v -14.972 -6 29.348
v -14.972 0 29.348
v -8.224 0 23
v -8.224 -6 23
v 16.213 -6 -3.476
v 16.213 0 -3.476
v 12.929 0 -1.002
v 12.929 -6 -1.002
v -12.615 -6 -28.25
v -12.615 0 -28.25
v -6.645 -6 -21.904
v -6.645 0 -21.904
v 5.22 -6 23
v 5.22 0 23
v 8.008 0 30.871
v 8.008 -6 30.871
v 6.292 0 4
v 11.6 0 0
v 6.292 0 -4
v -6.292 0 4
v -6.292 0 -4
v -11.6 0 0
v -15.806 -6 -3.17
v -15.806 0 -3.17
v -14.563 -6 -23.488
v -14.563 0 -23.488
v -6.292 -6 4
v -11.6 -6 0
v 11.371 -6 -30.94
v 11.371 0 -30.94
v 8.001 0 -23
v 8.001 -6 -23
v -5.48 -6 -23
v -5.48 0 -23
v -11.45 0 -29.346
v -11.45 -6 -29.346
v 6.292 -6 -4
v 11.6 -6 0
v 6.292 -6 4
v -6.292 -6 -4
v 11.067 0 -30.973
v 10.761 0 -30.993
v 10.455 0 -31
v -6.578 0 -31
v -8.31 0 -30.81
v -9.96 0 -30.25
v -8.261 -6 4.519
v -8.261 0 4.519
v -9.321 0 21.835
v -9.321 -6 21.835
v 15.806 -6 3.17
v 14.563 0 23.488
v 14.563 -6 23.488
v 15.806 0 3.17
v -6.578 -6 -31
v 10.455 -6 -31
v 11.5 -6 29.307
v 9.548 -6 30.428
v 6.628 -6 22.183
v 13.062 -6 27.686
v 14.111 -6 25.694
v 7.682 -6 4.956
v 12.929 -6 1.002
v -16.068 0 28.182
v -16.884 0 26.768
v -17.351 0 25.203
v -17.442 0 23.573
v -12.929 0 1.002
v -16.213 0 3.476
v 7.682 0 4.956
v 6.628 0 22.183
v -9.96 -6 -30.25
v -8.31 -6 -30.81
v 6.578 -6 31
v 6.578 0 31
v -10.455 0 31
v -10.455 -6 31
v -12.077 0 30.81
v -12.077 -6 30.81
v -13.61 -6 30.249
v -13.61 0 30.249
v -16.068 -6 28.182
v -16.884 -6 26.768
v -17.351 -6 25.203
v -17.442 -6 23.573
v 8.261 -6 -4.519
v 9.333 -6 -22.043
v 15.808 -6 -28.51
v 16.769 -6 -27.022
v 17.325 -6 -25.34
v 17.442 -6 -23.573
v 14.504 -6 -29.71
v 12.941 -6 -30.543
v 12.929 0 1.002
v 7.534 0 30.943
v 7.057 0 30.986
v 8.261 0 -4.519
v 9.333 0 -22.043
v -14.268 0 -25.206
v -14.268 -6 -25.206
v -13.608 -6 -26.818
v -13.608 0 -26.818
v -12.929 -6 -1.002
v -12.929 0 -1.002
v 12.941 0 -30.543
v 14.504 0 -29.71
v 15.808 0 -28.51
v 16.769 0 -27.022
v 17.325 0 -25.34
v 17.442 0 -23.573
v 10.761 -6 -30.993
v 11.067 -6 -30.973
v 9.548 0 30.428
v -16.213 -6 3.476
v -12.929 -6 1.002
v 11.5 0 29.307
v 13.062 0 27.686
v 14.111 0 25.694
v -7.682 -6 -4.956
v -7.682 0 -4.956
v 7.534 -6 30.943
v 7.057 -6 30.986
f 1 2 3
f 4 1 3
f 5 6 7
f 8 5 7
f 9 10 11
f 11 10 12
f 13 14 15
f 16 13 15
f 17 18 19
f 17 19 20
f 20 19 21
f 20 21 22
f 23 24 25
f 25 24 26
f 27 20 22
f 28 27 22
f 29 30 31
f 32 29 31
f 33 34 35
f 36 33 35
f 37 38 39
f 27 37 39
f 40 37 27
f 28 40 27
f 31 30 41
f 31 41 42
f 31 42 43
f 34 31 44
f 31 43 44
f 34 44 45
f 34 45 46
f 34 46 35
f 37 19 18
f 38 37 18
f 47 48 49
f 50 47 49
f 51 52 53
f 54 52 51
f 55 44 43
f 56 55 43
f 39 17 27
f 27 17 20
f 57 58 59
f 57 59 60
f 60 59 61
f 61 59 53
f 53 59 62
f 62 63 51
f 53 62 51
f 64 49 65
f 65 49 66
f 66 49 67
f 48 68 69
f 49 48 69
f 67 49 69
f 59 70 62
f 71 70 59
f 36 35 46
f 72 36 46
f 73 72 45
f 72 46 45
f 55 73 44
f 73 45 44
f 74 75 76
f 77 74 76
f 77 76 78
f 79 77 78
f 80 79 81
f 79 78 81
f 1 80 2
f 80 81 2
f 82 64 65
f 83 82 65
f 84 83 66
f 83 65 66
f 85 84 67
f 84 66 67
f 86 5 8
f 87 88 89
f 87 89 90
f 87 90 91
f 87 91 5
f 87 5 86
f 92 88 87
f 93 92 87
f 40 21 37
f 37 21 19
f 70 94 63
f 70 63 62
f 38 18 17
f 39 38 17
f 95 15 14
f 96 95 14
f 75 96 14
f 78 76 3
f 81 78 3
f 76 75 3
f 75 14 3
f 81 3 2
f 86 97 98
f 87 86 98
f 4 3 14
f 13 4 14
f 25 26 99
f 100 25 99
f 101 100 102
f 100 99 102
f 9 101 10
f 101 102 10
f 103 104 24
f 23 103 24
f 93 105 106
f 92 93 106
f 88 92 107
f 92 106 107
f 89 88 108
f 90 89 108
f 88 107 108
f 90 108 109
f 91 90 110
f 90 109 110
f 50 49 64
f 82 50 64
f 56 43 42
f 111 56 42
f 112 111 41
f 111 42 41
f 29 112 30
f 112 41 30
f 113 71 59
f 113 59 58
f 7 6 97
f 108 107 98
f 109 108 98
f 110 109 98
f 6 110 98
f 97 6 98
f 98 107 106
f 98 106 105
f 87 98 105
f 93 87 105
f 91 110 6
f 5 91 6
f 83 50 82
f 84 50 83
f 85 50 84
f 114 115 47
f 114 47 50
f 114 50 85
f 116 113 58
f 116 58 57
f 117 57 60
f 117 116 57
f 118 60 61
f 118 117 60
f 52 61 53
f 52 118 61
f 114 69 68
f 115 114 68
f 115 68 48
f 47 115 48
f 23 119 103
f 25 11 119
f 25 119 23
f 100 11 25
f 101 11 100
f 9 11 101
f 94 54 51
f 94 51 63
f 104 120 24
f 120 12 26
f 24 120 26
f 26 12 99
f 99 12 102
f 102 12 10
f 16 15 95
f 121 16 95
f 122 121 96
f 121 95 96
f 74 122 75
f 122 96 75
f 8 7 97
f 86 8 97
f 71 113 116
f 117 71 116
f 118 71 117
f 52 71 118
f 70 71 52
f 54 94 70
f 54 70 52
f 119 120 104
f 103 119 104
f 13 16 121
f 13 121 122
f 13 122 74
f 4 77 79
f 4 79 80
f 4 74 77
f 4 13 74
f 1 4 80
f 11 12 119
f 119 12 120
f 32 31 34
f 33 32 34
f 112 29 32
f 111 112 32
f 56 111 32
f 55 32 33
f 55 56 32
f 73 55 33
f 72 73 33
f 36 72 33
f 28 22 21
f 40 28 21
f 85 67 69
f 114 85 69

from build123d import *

# Parameters (mm, degrees)
BOSS_EXTRUDE1_DEPTH   = 6
BOSS_EXTRUDE1_2_DEPTH = 6
BOSS_EXTRUDE1_3_DEPTH = 6
BOSS_EXTRUDE1_4_DEPTH = 6
BOSS_EXTRUDE1_5_DEPTH = 6
BOSS_EXTRUDE1_6_DEPTH = 6
BOSS_EXTRUDE1_7_DEPTH = 6


with BuildPart() as part:
    # Sketch3 → Boss-Extrude1 (new body)
    with BuildSketch(Plane(origin=(0, 0, 0), x_dir=(1, 0, 0), z_dir=(0, 1, 0))):
        with BuildLine():
            ThreePointArc((-14.563388627, 23.488388316), (-13.982347964, 26.029888674), (-12.614994756, 28.249613324))
            Line((-12.614994756, 28.249613324), (-6.645362379, 21.903707215))
            Line((-6.645362379, 21.903707215), (-7.681935248, 4.955890615))
            Line((-7.681935248, 4.955890615), (-12.929312113, 1.001708527))
            Line((-12.929312113, 1.001708527), (-15.806141704, 3.169555117))
            Line((-15.806141704, 3.169555117), (-14.563388627, 23.488388316))
        make_face()
    extrude(amount=-BOSS_EXTRUDE1_DEPTH)


with BuildPart() as body_2:
    # Sketch3 → Boss-Extrude1 2 (new body)
    with BuildSketch(Plane(origin=(0, 0, 0), x_dir=(1, 0, 0), z_dir=(0, 1, 0))):
        with BuildLine():
            ThreePointArc((10.454822074, 31), (10.91413207, 30.984914769), (11.371462409, 30.939724094))
            Line((11.371462409, 30.939724094), (8.001249484, 23))
            Line((8.001249484, 23), (-5.479968827, 23))
            Line((-5.479968827, 23), (-11.449601204, 29.345906109))
            ThreePointArc((-11.449601204, 29.345906109), (-9.150541871, 30.57519798), (-6.57831024, 31))
            Line((-6.57831024, 31), (10.454822074, 31))
        make_face()
    extrude(amount=-BOSS_EXTRUDE1_2_DEPTH)


with BuildPart() as body_3:
    # Sketch3 → Boss-Extrude1 3 (new body)
    with BuildSketch(Plane(origin=(0, 0, 0), x_dir=(1, 0, 0), z_dir=(0, 1, 0))):
        with BuildLine():
            ThreePointArc((12.941431756, 30.543452628), (16.335726731, 27.796703889), (17.441765663, 23.572660223))
            Line((17.441765663, 23.572660223), (16.212591289, 3.475836847))
            Line((16.212591289, 3.475836847), (12.929312113, 1.001708527))
            Line((12.929312113, 1.001708527), (8.261456028, 4.519190384))
            Line((8.261456028, 4.519190384), (9.333267306, 22.043149873))
            Line((9.333267306, 22.043149873), (12.941431756, 30.543452628))
        make_face()
    extrude(amount=-BOSS_EXTRUDE1_3_DEPTH)


with BuildPart() as body_4:
    # Sketch3 → Boss-Extrude1 4 (new body)
    with BuildSketch(Plane(origin=(0, 0, 0), x_dir=(1, 0, 0), z_dir=(0, 1, 0))):
        Polygon((-6.291820714, -4), (-11.6, 0), (-6.291820714, 4), (6.291820714, 4), (11.6, 0), (6.291820714, -4), align=None)
    extrude(amount=-BOSS_EXTRUDE1_4_DEPTH)


with BuildPart() as body_5:
    # Sketch3 → Boss-Extrude1 5 (new body)
    with BuildSketch(Plane(origin=(0, 0, 0), x_dir=(1, 0, 0), z_dir=(0, 1, 0))):
        with BuildLine():
            ThreePointArc((-16.068158856, -28.182158554), (-17.163296944, -25.999091025), (-17.441765663, -23.572660223))
            Line((-17.441765663, -23.572660223), (-16.212591289, -3.475836847))
            Line((-16.212591289, -3.475836847), (-12.929312113, -1.001708527))
            Line((-12.929312113, -1.001708527), (-8.261456028, -4.519190384))
            Line((-8.261456028, -4.519190384), (-9.320512244, -21.834606448))
            Line((-9.320512244, -21.834606448), (-16.068158856, -28.182158554))
        make_face()
    extrude(amount=-BOSS_EXTRUDE1_5_DEPTH)


with BuildPart() as body_6:
    # Sketch3 → Boss-Extrude1 6 (new body)
    with BuildSketch(Plane(origin=(0, 0, 0), x_dir=(1, 0, 0), z_dir=(0, 1, 0))):
        with BuildLine():
            ThreePointArc((-10.454822074, -31), (-12.859726985, -30.573920624), (-14.971866072, -29.347552106))
            Line((-14.971866072, -29.347552106), (-8.224219459, -23))
            Line((-8.224219459, -23), (5.220423905, -23))
            Line((5.220423905, -23), (8.007780574, -30.871252414))
            ThreePointArc((8.007780574, -30.871252414), (7.295938517, -30.967748092), (6.57831024, -31))
            Line((6.57831024, -31), (-10.454822074, -31))
        make_face()
    extrude(amount=-BOSS_EXTRUDE1_6_DEPTH)


with BuildPart() as body_7:
    # Sketch3 → Boss-Extrude1 7 (new body)
    with BuildSketch(Plane(origin=(0, 0, 0), x_dir=(1, 0, 0), z_dir=(0, 1, 0))):
        with BuildLine():
            Line((6.62830762, -22.182550065), (9.548273172, -30.428278413))
            ThreePointArc((9.548273172, -30.428278413), (13.062425539, -27.685749543), (14.563388627, -23.488388316))
            Line((14.563388627, -23.488388316), (15.806141704, -3.169555117))
            Line((15.806141704, -3.169555117), (12.929312113, -1.001708527))
            Line((12.929312113, -1.001708527), (7.681935248, -4.955890615))
            Line((7.681935248, -4.955890615), (6.62830762, -22.182550065))
        make_face()
    extrude(amount=-BOSS_EXTRUDE1_7_DEPTH)


solid = Compound([part.part, body_2.part, body_3.part, body_4.part, body_5.part, body_6.part, body_7.part])
